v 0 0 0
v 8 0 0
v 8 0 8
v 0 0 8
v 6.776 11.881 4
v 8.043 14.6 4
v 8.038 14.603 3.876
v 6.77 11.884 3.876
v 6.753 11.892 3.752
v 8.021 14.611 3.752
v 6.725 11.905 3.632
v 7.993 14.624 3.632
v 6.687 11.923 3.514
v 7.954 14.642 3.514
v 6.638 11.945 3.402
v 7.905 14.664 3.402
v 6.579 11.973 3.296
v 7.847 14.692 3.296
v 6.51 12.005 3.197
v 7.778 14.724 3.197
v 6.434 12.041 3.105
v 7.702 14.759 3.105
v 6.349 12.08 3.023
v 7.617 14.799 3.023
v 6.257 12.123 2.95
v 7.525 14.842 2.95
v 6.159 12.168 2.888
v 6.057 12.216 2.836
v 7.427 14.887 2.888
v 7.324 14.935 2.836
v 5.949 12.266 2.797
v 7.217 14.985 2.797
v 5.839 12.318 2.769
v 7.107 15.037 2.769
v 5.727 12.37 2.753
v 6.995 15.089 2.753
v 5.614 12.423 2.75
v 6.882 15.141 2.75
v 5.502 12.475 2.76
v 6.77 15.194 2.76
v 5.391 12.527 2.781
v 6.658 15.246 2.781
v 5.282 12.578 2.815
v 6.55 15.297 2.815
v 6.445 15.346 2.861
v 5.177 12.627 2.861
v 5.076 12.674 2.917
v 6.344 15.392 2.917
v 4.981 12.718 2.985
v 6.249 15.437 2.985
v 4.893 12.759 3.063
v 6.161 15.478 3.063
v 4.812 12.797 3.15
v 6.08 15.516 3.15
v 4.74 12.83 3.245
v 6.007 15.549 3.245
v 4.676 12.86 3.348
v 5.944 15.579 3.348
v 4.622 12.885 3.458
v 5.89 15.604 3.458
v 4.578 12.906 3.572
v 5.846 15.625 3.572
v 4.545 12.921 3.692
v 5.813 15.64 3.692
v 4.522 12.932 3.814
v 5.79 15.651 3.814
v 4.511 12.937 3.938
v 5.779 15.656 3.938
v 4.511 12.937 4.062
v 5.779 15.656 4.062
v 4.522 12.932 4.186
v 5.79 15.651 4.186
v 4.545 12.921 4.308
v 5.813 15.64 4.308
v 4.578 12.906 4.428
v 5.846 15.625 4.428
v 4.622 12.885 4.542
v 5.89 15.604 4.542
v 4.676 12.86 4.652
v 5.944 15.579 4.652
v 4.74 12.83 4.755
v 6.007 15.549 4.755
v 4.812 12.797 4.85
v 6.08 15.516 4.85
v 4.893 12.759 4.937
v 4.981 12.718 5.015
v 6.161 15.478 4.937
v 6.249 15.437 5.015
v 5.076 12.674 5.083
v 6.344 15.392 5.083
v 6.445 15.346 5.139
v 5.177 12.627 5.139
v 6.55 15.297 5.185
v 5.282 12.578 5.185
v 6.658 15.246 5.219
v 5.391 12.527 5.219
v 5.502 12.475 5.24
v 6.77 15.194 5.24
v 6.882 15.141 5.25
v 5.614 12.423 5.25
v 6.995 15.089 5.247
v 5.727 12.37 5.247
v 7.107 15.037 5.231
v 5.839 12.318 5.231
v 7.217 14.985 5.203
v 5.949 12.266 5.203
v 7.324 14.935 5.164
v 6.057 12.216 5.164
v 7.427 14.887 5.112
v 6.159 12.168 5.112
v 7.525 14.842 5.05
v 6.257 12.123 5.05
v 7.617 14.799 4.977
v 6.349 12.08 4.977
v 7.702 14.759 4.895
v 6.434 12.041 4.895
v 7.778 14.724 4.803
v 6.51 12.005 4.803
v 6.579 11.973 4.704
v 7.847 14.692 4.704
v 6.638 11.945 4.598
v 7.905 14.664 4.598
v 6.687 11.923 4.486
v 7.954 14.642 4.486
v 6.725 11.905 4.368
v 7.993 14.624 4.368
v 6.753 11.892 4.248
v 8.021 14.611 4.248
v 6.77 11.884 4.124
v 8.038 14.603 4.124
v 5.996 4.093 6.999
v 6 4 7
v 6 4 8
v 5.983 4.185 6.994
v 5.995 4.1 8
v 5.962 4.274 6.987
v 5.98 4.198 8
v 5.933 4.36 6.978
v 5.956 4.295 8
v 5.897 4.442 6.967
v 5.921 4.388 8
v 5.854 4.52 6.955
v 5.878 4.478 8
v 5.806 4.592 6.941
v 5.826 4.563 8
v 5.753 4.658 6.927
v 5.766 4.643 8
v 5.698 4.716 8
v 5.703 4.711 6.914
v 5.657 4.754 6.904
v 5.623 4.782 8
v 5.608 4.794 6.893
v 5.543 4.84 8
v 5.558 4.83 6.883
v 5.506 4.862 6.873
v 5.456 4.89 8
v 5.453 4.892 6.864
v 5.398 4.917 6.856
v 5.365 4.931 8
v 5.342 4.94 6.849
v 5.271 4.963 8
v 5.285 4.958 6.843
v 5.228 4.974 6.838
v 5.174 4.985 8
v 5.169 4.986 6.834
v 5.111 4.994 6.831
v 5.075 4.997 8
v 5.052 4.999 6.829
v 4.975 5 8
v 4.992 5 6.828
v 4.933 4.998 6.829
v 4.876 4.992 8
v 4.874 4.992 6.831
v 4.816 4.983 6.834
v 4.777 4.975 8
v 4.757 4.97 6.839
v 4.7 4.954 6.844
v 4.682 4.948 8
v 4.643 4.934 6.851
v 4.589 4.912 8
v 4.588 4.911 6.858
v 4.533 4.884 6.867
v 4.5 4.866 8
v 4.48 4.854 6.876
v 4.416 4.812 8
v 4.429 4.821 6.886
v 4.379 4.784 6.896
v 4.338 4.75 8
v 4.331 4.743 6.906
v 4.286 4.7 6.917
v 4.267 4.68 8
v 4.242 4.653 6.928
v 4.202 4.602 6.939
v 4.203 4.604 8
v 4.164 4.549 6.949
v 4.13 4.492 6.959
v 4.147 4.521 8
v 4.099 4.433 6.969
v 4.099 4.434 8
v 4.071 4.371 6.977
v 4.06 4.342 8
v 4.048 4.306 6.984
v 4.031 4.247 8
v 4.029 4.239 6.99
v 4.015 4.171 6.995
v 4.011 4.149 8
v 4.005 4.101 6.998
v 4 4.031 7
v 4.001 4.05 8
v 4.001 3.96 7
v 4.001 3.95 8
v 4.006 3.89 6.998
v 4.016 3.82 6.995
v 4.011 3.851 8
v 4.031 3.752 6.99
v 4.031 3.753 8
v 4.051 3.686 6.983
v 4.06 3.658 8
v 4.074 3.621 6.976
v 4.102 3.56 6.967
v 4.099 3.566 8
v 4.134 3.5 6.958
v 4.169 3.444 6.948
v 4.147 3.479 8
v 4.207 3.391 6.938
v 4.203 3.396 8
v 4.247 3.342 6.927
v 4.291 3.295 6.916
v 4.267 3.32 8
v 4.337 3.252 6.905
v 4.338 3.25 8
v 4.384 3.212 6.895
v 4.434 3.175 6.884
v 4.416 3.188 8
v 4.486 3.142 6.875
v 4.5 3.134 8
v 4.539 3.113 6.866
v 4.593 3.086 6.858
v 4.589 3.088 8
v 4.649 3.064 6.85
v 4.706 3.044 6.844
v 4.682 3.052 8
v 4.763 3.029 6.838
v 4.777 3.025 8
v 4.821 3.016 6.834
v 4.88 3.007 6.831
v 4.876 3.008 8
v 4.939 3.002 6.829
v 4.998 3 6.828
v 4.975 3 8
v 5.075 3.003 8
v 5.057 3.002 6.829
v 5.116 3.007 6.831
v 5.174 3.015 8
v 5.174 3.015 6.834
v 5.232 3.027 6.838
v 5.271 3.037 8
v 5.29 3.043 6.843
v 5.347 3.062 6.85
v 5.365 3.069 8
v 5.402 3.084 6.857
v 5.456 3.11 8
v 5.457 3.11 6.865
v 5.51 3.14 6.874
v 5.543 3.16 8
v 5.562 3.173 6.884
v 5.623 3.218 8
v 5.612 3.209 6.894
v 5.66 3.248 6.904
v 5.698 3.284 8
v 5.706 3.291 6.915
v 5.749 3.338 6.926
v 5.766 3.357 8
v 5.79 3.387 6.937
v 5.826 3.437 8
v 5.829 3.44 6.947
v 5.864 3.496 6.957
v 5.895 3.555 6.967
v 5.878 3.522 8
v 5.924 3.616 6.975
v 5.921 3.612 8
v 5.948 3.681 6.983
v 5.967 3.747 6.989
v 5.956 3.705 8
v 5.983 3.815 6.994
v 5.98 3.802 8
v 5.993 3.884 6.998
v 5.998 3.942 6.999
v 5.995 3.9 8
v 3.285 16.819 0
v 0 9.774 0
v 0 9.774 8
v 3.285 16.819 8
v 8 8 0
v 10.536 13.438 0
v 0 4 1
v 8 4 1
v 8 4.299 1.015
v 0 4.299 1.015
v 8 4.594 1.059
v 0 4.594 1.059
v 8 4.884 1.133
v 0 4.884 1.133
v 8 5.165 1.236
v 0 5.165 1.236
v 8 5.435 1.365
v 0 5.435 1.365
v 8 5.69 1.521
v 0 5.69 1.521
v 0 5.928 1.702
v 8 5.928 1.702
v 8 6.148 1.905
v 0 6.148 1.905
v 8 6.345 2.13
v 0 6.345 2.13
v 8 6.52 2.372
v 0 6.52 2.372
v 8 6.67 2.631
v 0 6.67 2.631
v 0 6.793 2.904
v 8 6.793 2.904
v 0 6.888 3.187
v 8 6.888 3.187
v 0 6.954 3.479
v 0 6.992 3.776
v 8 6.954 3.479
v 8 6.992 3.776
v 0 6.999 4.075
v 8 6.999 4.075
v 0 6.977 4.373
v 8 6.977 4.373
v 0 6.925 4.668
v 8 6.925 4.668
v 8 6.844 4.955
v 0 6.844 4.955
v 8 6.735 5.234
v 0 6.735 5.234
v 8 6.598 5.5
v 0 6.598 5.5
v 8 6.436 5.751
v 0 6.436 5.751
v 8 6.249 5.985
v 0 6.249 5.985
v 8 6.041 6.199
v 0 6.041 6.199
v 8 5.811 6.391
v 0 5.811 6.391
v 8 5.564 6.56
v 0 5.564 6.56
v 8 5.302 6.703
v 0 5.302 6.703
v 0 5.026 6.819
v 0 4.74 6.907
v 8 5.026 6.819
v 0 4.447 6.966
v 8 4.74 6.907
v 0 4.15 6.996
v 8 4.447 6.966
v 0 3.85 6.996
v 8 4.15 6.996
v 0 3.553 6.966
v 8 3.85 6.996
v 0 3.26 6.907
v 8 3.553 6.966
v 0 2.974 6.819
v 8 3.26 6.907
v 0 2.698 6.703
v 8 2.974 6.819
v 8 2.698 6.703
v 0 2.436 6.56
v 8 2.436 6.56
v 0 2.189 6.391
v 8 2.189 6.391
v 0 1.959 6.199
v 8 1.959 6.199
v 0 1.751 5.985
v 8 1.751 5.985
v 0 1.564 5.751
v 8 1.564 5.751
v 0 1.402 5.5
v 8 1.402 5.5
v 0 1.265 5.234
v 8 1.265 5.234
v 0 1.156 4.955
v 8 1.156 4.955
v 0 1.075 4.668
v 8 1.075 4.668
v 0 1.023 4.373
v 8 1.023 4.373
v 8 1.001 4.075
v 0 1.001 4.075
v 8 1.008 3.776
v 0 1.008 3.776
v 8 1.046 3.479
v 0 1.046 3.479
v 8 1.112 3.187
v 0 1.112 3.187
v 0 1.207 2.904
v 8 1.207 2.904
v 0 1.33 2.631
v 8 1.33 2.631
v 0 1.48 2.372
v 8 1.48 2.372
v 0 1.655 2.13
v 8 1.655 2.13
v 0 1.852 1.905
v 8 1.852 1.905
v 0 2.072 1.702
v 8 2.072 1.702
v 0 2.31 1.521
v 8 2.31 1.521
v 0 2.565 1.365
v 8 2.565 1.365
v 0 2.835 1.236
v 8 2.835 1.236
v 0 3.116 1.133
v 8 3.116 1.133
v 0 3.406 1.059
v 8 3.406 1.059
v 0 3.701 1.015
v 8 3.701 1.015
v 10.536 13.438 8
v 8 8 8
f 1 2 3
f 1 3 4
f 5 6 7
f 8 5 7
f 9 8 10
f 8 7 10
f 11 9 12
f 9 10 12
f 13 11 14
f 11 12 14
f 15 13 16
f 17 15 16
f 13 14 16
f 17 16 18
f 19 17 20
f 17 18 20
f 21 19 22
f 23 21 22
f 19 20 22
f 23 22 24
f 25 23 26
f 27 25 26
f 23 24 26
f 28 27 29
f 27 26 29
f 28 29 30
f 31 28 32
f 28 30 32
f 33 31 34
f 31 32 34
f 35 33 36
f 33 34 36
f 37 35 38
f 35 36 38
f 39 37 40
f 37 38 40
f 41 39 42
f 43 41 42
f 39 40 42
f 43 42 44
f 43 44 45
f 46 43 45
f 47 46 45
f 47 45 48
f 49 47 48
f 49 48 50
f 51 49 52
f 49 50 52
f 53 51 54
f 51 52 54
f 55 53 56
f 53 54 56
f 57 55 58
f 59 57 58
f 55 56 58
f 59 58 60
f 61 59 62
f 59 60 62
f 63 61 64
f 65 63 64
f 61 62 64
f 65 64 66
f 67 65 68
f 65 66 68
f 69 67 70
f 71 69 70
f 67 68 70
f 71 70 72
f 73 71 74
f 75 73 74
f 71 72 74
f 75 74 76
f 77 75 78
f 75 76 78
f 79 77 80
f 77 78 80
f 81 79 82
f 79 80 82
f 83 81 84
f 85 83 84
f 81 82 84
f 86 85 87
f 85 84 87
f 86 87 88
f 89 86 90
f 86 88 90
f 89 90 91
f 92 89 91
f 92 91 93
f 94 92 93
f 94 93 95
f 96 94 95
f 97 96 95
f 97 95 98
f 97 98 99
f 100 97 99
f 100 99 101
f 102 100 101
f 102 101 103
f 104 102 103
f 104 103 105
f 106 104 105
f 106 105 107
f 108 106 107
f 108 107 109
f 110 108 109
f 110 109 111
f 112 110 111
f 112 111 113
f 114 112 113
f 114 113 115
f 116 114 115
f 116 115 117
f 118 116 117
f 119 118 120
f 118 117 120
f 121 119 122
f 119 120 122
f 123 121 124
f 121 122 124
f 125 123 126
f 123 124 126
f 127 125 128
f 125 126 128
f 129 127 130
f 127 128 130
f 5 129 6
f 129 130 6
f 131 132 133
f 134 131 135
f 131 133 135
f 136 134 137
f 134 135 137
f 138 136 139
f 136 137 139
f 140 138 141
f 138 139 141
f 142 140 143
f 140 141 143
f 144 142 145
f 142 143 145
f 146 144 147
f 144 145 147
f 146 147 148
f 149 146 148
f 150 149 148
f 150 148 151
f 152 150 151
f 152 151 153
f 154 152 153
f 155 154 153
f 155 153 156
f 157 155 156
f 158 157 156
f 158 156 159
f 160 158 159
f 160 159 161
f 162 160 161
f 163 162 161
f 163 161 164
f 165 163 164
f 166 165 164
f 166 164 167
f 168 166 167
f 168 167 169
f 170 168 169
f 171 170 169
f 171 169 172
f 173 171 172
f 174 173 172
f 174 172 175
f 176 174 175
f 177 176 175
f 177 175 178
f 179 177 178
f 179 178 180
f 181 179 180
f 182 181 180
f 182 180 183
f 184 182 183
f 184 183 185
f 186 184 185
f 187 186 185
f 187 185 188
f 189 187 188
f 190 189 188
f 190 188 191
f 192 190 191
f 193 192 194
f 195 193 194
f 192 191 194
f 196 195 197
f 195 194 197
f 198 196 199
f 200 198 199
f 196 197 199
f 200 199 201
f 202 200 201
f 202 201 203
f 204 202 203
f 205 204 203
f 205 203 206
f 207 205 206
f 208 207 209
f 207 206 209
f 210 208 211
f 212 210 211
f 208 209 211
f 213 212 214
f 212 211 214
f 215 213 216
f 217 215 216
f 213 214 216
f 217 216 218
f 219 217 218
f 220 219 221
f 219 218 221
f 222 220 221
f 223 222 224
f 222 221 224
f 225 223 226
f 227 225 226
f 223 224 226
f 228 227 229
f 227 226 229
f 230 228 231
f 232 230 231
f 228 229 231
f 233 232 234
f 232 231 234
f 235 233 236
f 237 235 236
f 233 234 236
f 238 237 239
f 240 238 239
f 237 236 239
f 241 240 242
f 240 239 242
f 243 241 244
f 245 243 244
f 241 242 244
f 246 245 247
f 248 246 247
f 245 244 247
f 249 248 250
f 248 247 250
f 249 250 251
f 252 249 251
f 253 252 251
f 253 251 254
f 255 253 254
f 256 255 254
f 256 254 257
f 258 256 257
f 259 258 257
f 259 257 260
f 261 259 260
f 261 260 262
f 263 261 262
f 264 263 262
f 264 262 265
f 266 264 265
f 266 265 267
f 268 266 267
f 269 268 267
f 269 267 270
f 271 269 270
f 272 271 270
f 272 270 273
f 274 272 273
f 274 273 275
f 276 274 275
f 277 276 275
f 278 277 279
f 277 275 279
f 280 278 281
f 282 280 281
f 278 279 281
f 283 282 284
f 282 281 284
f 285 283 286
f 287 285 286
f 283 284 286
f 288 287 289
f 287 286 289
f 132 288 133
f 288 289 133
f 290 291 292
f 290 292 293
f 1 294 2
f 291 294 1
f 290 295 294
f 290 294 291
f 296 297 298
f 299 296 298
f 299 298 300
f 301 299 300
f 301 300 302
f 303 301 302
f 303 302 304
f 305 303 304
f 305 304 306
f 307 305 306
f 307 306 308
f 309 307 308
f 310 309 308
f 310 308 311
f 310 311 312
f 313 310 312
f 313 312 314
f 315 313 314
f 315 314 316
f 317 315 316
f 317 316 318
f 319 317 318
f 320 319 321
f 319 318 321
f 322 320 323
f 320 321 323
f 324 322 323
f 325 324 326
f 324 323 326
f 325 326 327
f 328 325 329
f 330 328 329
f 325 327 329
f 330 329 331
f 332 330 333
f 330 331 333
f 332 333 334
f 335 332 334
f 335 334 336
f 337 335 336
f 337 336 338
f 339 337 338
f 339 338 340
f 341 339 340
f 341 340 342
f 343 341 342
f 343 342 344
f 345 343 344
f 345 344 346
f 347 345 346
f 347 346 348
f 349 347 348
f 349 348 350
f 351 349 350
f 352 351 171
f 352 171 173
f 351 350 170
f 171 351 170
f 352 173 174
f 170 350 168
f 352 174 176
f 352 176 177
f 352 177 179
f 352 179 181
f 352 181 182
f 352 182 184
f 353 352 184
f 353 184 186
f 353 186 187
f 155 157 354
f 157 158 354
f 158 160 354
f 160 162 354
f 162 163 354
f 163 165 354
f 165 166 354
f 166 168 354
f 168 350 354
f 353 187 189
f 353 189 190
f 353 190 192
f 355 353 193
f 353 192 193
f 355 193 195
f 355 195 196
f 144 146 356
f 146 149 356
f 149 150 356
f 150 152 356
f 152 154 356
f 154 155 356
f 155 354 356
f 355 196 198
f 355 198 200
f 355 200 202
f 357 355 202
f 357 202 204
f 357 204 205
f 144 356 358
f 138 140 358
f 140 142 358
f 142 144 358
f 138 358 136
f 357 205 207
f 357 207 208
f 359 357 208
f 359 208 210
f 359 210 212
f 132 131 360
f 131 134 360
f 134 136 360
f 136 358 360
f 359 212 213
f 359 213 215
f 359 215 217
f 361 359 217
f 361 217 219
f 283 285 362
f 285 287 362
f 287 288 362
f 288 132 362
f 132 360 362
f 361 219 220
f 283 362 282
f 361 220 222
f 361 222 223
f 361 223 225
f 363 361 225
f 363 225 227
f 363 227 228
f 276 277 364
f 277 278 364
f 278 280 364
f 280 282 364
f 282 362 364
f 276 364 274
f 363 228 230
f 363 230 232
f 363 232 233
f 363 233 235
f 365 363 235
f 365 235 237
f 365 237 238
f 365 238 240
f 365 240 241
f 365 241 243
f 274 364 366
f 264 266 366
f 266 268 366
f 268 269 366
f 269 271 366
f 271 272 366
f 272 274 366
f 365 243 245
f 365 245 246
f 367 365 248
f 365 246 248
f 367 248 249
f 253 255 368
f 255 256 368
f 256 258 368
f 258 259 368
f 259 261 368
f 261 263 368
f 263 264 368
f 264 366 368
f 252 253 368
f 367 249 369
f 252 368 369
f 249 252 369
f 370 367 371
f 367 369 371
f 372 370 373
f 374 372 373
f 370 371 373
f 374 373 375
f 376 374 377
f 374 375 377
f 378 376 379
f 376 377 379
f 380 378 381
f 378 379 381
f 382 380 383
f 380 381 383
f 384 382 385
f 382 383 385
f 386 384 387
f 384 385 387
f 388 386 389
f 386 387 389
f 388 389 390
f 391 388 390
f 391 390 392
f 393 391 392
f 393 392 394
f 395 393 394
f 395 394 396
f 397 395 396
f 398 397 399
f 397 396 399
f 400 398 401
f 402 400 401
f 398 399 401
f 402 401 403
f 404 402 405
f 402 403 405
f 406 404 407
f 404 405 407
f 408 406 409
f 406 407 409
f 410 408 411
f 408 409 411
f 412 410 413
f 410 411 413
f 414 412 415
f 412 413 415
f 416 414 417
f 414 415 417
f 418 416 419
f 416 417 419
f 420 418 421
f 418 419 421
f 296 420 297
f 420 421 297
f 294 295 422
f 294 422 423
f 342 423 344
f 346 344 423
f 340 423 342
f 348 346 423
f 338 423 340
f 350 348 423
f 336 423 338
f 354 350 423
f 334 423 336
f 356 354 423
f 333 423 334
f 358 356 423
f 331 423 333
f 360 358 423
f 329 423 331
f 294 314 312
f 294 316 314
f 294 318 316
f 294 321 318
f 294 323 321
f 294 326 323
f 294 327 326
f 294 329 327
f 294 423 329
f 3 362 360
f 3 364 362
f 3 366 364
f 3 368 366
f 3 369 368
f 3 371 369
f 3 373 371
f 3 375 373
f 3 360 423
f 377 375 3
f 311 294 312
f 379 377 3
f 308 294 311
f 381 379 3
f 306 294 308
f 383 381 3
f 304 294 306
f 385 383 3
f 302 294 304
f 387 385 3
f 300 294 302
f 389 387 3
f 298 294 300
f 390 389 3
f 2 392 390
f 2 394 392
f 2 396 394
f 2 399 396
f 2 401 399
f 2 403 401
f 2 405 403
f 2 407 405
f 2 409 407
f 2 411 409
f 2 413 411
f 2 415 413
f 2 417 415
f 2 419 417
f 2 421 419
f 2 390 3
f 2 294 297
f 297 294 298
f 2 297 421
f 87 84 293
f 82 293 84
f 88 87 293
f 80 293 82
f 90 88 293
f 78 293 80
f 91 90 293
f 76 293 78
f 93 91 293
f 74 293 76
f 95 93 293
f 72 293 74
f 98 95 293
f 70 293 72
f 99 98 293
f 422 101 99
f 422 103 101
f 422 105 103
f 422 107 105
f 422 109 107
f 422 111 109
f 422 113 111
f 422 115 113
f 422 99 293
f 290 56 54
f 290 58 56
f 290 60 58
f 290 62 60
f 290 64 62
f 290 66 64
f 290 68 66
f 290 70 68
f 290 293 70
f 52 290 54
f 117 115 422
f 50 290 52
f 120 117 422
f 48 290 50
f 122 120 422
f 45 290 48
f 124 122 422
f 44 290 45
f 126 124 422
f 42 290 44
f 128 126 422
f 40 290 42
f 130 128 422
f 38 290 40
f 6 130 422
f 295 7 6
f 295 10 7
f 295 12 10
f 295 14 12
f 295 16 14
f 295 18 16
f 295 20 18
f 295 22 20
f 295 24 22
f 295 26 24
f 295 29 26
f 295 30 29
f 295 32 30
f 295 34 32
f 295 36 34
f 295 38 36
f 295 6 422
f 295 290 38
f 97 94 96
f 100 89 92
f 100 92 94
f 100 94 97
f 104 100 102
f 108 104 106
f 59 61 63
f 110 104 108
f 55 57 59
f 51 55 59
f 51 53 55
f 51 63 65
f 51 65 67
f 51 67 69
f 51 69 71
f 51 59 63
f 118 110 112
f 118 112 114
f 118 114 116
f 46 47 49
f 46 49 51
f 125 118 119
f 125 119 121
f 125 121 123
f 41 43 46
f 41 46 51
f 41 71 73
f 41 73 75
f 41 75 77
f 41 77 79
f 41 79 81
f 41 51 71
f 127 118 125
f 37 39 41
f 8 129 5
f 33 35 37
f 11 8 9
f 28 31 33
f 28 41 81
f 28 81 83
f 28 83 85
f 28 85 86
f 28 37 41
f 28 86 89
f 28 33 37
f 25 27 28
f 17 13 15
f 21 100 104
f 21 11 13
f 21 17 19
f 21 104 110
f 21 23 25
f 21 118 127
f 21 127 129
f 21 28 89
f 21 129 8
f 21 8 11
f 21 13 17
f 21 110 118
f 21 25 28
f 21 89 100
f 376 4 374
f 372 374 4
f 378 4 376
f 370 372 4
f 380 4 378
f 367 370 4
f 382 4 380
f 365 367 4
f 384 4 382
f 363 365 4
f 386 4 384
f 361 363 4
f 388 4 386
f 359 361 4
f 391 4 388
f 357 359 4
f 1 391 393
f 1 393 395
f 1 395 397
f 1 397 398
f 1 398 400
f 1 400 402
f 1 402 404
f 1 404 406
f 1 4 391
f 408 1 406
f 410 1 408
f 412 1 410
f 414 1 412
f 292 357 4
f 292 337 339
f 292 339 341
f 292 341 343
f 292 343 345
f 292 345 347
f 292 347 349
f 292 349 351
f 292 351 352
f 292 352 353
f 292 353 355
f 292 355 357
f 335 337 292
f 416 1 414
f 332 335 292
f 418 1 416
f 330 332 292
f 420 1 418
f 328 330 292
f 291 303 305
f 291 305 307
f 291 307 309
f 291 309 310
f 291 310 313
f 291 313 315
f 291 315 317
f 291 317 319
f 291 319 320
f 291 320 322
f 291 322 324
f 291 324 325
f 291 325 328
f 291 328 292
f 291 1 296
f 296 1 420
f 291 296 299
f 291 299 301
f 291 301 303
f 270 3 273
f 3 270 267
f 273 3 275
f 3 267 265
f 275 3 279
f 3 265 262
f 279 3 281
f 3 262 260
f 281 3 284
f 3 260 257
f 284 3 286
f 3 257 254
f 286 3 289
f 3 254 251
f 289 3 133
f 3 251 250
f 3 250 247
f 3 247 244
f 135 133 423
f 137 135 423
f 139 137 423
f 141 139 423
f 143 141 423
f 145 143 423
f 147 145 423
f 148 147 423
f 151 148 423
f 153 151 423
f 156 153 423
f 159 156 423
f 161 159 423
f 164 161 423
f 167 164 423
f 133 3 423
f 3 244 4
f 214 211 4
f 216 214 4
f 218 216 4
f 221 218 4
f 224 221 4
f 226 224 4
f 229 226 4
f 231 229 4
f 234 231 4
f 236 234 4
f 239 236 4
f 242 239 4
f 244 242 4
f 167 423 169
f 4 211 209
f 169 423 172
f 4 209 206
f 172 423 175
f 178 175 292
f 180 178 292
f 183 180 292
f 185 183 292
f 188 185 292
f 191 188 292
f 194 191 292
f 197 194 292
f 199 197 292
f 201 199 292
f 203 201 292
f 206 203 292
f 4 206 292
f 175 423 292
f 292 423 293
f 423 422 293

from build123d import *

# Parameters (mm, degrees)
BOSS_EXTRUDE1_DEPTH = 8
CUT_EXTRUDE1_REACH  = 10
SKETCH3_R           = 3
CUT_EXTRUDE2_REACH  = 10
SKETCH4_R           = 1
SKETCH5_R           = 1.25
CUT_EXTRUDE3_DEPTH  = 3


with BuildPart() as part:
    # Sketch2 → Boss-Extrude1 (new body)
    with BuildSketch(Plane.XY):
        Polygon((8, 0), (0, 0), (0, 9.773557301), (3.285247274, 16.818792816), (10.53570957, 13.437846722), (8, 8), align=None)
    extrude(amount=BOSS_EXTRUDE1_DEPTH)

    # Sketch3 → Cut-Extrude1 (cut, up to next)
    with BuildSketch(Plane(origin=(8, 0, 0), x_dir=(0, 0, -1), z_dir=(1, 0, 0)), mode=Mode.PRIVATE) as cut_extrude1_sk1:
        with Locations((-4, 4)):
            Circle(SKETCH3_R)
    cut_extrude1_tool1 = extrude(cut_extrude1_sk1.sketch, amount=-CUT_EXTRUDE1_REACH, mode=Mode.PRIVATE) & part.part
    add(cut_extrude1_tool1.solids().sort_by_distance((8, 4, 4))[0], mode=Mode.SUBTRACT)

    # Sketch4 → Cut-Extrude2 (cut, up to next)
    with BuildSketch(Plane.XY.offset(8), mode=Mode.PRIVATE) as cut_extrude2_sk1:
        with Locations((5, 4)):
            Circle(SKETCH4_R)
    cut_extrude2_tool1 = extrude(cut_extrude2_sk1.sketch, amount=-CUT_EXTRUDE2_REACH, mode=Mode.PRIVATE) & part.part
    add(cut_extrude2_tool1.solids().sort_by_distance((5, 4, 8))[0], mode=Mode.SUBTRACT)

    # Sketch5 → Cut-Extrude3 (cut)
    with BuildSketch(Plane(origin=(7.028736904, 15.073174933, 0), x_dir=(0.906307787, -0.422618262, 0), z_dir=(0.422618262, 0.906307787, 0))):
        with Locations((-0.130483798, -4)):
            Circle(SKETCH5_R)
    extrude(amount=-CUT_EXTRUDE3_DEPTH, mode=Mode.SUBTRACT)


solid = part.part
